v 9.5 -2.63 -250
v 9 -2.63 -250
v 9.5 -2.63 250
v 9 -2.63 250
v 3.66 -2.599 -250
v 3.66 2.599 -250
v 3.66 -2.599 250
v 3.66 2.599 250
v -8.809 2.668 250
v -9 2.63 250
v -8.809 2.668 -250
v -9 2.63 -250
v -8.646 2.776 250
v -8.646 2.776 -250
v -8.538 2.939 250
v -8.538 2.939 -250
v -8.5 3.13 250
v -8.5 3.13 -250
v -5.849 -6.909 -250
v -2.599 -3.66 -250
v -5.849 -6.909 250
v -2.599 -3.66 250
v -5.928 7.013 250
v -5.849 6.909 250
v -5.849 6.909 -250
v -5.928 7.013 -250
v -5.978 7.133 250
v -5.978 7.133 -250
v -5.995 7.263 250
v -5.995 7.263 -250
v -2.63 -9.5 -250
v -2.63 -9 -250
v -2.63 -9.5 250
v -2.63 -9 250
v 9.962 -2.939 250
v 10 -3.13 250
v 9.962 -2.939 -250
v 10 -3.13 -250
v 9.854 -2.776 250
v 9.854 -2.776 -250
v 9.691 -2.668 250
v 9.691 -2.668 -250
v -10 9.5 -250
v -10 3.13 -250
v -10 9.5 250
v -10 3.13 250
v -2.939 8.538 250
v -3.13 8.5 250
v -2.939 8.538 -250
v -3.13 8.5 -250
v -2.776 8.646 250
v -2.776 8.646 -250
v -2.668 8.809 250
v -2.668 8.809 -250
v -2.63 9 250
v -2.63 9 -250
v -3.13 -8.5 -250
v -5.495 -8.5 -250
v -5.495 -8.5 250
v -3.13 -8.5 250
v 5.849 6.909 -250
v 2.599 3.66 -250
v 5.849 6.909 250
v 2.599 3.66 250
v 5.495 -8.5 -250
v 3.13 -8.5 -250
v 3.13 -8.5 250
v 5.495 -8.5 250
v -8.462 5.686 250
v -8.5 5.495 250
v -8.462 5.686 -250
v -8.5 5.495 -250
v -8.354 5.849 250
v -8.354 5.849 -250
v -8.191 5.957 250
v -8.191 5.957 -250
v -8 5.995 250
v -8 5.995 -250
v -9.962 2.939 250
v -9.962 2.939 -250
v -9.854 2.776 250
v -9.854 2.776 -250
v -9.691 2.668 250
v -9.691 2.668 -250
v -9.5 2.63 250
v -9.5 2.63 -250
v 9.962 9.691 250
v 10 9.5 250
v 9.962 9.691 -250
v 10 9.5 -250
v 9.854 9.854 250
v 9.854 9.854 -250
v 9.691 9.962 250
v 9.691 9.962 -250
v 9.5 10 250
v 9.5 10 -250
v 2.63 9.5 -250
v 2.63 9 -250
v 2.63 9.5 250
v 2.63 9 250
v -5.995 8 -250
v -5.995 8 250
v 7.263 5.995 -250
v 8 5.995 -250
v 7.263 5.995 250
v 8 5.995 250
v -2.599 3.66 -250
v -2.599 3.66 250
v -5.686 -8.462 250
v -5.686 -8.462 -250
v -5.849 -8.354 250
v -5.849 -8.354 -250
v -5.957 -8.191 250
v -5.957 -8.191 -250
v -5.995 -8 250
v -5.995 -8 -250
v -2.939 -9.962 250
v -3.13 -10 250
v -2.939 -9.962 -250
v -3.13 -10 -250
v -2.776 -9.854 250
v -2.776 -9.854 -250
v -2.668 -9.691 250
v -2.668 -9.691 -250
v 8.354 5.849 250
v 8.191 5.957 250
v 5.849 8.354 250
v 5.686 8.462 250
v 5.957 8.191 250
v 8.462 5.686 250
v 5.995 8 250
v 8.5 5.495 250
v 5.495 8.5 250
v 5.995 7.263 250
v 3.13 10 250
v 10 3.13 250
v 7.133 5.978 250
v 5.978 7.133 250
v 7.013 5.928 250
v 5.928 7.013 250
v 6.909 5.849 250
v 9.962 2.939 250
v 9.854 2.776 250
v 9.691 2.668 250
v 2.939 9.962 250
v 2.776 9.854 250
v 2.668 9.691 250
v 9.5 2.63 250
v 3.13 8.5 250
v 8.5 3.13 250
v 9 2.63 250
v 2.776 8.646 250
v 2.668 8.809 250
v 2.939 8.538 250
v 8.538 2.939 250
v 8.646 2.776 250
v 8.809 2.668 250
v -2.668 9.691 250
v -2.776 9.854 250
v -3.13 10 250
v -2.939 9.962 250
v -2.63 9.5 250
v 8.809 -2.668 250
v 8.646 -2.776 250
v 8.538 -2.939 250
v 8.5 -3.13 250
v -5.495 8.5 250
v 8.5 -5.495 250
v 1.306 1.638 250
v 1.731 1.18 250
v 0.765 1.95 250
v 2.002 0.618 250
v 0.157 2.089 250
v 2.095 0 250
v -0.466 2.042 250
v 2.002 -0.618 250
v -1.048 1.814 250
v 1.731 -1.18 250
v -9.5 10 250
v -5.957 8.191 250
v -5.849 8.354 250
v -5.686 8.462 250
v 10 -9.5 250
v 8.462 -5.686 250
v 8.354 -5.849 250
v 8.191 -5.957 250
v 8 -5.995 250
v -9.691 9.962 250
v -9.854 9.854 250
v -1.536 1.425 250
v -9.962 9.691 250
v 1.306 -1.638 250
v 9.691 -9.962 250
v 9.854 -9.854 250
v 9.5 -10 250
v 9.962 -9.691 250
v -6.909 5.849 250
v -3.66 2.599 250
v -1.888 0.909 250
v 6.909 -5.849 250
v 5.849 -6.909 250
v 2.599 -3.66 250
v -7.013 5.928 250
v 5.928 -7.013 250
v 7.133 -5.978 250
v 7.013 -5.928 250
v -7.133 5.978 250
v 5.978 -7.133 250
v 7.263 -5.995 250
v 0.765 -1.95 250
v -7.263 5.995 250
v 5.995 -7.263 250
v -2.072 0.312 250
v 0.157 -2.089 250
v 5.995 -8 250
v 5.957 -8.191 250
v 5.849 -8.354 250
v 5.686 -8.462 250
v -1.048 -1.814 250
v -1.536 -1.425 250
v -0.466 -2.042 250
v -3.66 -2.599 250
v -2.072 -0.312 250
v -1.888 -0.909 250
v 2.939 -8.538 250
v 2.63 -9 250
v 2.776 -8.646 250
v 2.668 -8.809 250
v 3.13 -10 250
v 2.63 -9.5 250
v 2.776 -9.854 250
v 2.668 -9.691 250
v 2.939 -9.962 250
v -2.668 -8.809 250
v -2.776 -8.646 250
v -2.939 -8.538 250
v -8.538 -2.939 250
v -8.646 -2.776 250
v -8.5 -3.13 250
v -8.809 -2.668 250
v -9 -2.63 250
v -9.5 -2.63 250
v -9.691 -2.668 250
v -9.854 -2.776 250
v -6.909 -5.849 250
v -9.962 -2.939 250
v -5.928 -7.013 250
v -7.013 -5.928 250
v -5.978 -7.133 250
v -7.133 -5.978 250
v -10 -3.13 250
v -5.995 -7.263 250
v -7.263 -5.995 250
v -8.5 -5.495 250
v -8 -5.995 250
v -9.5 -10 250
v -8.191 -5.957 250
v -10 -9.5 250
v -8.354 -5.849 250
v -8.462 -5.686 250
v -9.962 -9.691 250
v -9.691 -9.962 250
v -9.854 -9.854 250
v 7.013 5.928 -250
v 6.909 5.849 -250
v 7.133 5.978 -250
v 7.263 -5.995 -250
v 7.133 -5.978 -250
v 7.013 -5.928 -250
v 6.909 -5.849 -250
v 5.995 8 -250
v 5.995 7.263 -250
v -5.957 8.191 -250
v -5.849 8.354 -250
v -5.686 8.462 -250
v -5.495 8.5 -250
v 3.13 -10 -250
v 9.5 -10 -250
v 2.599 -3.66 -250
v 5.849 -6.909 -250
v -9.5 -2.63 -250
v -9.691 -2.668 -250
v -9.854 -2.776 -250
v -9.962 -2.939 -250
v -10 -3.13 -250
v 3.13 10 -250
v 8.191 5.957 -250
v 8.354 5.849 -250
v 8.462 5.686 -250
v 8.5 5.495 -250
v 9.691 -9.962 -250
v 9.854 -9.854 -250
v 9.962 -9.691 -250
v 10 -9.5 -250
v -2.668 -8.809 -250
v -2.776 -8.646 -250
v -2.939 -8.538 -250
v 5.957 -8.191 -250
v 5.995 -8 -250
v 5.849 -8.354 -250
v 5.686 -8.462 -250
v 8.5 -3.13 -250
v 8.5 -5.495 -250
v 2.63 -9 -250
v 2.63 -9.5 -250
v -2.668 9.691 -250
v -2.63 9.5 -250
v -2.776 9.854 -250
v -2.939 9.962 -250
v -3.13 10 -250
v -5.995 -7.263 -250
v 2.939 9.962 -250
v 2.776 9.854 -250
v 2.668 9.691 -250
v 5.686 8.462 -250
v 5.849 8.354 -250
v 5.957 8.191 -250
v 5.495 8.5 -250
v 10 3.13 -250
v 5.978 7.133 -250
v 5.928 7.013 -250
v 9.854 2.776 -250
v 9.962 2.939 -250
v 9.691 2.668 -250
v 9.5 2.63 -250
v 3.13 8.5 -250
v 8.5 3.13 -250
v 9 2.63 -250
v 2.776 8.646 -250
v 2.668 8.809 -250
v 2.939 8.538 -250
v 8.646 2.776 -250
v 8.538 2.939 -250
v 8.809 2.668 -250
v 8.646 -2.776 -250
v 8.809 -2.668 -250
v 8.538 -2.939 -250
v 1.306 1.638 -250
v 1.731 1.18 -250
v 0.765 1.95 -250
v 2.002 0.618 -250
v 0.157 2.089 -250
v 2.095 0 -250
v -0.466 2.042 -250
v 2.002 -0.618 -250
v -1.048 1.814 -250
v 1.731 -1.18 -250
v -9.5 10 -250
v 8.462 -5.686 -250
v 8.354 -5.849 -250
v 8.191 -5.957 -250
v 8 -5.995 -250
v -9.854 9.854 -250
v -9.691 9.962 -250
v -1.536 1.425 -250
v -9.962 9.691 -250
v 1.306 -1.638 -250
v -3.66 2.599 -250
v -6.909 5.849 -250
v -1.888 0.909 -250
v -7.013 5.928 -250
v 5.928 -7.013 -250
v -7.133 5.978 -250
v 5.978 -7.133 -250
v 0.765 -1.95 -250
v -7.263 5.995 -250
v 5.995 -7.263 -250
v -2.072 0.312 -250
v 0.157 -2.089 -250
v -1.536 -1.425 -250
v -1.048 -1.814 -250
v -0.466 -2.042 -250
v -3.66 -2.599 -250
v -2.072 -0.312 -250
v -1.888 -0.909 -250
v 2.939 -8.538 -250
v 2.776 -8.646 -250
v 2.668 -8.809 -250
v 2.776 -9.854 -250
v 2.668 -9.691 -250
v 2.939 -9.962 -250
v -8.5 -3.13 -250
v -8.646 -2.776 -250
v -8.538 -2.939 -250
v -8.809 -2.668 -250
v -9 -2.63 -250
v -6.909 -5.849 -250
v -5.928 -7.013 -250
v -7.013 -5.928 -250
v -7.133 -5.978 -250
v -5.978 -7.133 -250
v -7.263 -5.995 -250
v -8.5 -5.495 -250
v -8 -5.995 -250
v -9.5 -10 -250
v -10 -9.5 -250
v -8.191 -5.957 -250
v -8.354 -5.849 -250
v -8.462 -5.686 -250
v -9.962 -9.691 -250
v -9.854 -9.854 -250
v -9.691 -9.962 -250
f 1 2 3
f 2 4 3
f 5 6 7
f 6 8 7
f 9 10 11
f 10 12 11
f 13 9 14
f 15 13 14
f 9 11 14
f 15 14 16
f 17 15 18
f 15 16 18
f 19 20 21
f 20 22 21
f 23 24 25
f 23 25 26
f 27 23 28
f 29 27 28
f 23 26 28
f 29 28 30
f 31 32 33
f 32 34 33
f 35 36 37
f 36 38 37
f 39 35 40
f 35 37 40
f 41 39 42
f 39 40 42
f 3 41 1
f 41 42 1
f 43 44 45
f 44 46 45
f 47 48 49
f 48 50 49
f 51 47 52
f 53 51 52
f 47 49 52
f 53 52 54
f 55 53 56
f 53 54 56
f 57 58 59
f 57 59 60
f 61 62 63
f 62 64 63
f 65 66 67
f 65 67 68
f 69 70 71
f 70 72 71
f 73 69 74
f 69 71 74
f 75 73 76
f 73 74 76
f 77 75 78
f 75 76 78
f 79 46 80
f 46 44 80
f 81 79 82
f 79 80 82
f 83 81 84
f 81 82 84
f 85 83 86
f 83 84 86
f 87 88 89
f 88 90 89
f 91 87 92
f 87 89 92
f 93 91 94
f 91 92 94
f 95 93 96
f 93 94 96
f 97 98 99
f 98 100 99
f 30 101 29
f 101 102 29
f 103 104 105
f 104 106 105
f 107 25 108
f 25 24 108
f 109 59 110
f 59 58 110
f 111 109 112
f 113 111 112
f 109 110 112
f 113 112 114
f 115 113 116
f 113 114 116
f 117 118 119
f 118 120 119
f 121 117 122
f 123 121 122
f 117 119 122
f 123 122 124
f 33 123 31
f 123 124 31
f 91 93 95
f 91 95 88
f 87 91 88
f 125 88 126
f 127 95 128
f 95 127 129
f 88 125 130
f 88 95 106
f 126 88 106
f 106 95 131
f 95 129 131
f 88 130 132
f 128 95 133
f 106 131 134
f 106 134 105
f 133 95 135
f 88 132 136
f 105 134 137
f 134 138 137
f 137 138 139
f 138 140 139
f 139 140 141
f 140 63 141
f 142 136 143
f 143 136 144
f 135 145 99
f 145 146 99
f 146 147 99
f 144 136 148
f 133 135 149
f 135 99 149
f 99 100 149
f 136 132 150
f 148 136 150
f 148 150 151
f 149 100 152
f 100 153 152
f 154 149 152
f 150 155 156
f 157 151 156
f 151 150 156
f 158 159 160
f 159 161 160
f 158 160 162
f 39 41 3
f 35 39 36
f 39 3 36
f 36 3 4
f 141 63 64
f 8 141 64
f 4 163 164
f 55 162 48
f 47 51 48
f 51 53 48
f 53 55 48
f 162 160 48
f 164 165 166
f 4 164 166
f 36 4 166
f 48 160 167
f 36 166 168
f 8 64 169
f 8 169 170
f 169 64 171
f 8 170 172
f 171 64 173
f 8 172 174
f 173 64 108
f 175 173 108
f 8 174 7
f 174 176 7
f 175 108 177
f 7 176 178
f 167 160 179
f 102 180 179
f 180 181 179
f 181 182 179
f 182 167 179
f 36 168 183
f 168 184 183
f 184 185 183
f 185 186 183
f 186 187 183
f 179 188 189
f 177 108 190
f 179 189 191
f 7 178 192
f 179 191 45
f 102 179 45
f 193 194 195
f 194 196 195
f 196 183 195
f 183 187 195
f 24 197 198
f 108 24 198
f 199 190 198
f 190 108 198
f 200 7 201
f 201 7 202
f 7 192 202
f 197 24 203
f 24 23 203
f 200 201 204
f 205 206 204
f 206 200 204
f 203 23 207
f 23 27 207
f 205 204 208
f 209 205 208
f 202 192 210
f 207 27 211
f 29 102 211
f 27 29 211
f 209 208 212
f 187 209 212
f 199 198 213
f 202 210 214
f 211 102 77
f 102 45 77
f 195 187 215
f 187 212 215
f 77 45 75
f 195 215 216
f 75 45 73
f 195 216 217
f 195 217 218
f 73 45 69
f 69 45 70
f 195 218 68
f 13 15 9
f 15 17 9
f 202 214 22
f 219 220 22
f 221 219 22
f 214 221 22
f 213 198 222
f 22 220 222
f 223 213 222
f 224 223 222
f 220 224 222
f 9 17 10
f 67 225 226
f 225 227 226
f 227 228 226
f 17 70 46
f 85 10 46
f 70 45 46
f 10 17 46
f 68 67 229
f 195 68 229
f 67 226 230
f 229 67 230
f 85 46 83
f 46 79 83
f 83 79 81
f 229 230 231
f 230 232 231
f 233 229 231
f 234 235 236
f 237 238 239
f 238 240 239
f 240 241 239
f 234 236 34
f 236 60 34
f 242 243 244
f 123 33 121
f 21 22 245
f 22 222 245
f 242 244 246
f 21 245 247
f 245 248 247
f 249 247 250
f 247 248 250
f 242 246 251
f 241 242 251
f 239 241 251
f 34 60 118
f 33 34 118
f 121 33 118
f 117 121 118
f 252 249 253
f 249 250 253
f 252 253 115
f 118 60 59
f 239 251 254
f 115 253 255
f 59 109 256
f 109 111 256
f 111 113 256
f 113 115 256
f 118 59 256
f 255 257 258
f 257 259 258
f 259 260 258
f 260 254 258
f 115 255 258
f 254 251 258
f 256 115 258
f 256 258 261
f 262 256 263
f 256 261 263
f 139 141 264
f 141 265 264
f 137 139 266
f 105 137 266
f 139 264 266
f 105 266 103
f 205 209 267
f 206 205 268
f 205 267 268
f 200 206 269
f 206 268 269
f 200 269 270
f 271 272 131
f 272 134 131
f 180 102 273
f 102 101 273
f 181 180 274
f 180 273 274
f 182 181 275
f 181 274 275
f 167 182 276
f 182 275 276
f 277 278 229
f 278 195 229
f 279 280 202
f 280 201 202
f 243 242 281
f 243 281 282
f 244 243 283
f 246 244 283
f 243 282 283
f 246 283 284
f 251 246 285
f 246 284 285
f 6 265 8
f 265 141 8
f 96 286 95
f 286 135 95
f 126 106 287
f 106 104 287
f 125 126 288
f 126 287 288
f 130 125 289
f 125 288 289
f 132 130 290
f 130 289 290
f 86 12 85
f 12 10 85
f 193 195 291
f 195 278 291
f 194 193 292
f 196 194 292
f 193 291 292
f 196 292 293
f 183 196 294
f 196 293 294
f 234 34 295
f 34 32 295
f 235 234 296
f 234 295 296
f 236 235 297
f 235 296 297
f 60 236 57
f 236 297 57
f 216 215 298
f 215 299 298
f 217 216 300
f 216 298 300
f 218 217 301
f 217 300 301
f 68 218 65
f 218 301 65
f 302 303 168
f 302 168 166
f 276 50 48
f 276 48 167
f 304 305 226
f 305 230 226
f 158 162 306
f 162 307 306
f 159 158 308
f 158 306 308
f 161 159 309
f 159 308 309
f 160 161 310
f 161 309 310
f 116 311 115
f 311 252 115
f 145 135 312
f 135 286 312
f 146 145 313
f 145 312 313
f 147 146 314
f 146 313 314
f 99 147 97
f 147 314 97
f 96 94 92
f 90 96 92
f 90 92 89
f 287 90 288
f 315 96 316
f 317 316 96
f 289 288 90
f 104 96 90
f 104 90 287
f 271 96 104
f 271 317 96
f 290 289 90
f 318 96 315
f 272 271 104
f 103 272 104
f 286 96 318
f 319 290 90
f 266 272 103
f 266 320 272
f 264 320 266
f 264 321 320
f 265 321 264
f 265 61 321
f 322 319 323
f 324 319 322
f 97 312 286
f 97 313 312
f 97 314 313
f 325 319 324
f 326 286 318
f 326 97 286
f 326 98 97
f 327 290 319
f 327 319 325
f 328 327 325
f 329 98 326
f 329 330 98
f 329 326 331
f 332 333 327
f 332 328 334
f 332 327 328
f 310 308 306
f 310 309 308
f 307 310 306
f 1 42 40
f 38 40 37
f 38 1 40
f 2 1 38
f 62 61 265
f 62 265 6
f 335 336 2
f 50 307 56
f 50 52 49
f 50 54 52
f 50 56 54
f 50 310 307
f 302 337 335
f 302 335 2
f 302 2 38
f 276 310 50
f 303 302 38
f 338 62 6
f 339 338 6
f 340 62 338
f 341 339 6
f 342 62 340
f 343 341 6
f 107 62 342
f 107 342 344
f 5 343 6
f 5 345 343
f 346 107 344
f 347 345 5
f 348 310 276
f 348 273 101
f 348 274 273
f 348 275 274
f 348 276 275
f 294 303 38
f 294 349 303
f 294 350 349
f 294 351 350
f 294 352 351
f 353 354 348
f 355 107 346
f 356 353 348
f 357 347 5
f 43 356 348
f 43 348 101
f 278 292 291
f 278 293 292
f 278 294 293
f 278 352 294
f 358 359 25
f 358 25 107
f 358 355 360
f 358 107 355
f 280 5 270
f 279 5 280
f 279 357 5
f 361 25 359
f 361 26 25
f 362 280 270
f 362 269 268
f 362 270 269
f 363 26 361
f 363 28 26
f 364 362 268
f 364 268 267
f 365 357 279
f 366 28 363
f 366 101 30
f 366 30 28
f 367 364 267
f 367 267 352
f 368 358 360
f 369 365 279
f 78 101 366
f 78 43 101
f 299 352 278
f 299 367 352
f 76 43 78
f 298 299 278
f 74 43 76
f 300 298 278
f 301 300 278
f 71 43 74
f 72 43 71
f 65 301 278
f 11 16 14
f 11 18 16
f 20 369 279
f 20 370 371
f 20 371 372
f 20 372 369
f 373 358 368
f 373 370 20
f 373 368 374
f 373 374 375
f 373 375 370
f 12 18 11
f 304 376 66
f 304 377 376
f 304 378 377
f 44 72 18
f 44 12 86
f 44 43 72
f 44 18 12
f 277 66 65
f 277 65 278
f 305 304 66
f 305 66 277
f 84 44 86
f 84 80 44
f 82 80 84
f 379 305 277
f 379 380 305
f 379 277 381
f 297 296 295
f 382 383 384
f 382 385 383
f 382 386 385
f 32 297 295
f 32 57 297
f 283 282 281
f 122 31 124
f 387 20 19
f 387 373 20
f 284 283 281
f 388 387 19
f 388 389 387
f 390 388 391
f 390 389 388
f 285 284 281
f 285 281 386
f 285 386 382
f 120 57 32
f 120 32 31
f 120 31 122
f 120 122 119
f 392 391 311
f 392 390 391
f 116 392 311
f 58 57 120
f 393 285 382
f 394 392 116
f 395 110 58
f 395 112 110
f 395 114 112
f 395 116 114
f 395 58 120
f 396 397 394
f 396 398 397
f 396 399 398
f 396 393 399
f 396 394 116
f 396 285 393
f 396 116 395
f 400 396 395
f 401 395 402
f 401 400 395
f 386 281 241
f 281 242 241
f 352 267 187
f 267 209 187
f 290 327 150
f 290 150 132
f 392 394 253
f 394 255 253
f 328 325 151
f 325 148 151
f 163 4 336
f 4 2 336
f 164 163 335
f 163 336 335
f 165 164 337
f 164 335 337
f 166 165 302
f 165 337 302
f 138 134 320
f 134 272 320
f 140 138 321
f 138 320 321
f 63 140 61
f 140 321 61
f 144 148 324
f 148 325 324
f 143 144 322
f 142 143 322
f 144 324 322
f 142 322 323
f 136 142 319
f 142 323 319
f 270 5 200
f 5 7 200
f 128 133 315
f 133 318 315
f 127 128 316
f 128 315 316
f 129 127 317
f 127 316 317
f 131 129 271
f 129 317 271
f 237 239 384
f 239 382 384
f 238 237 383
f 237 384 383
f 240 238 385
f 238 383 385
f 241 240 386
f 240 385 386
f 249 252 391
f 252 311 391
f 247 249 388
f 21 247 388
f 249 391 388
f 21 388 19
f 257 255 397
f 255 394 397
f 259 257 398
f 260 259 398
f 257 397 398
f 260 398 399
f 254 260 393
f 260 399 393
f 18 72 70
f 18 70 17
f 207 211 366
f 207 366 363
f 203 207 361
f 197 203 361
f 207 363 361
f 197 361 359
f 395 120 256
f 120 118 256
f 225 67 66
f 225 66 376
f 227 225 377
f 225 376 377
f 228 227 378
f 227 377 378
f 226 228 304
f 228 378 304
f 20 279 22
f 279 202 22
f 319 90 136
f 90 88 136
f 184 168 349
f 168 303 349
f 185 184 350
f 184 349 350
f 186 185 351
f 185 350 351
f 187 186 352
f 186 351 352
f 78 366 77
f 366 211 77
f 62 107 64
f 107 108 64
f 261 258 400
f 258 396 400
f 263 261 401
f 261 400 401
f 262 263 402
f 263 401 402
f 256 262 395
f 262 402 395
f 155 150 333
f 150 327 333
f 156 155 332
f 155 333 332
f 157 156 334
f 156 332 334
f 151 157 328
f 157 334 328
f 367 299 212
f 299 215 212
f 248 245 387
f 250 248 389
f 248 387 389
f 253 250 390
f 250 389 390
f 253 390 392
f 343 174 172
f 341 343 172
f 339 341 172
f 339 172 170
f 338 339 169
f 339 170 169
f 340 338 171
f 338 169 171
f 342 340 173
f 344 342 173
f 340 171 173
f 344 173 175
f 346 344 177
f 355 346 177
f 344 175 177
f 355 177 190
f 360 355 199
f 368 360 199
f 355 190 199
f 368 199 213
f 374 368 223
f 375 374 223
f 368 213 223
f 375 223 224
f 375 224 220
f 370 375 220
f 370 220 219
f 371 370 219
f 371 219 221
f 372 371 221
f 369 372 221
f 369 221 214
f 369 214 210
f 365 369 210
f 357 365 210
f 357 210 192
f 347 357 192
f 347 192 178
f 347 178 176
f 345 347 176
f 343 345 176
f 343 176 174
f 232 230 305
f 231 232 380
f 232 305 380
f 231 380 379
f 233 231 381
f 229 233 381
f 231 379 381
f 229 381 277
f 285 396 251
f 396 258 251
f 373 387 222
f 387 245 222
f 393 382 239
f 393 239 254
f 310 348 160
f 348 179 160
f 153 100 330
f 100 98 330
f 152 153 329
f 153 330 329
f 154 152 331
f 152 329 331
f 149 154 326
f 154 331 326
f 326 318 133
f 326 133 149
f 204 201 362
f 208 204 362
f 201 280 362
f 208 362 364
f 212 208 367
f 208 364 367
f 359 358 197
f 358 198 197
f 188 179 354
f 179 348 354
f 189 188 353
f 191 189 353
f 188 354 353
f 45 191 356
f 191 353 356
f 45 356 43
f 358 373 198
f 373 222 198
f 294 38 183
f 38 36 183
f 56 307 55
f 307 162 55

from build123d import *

# Parameters (mm, degrees)
BOSS_EXTRUDE1_DEPTH      = 250
FILLET1_R                = 0.5
CIRPATTERN3_COUNT        = 4
FILLET1_OF_CIRPATTERN3_R = 0.5
SKETCH3_R                = 2.095
CUT_EXTRUDE1_DEPTH       = 501.199960016


with BuildPart() as part:
    # Sketch2 → Boss-Extrude1 (new, symmetric)
    with BuildSketch(Plane.XY):
        Polygon((0, 3.66), (2.599339828, 3.66), (5.995, 7.055660172), (5.995, 8.5), (2.63, 8.5), (2.63, 10), (10, 10), (10, 2.63), (8.5, 2.63), (8.5, 5.995), (7.055660172, 5.995), (3.66, 2.599339828), (3.66, 0), (0, 0), align=None)
    boss_extrude1 = extrude(amount=BOSS_EXTRUDE1_DEPTH, both=True)

    # Fillet1
    fillet1_edges = [part.edges().sort_by_distance(p)[0] for p in [
        (5.995, 7.055660172, 0),
        (5.995, 8.5, 0),
        (2.63, 8.5, 0),
        (2.63, 10, 0),
        (10, 10, 0),
        (10, 2.63, 0),
        (8.5, 2.63, 0),
        (8.5, 5.995, 0),
        (7.055660172, 5.995, 0),
    ]]
    fillet(fillet1_edges, radius=FILLET1_R)

    # CirPattern3: Boss-Extrude1 ×4 about axis
    cirpattern3_axis = Axis((0, 0, 250), (0, 0, -1))
    for i in range(1, CIRPATTERN3_COUNT):
        add(boss_extrude1.rotate(cirpattern3_axis, i * 360 / CIRPATTERN3_COUNT))

    # Fillet1 of CirPattern3
    fillet1_of_cirpattern3_edges = [part.edges().sort_by_distance(p)[0] for p in [
        (7.055660172, -5.995, 0),
        (8.5, -5.995, 0),
        (8.5, -2.63, 0),
        (10, -2.63, 0),
        (10, -10, 0),
        (2.63, -10, 0),
        (2.63, -8.5, 0),
        (5.995, -8.5, 0),
        (5.995, -7.055660172, 0),
        (-5.995, -7.055660172, 0),
        (-5.995, -8.5, 0),
        (-2.63, -8.5, 0),
        (-2.63, -10, 0),
        (-10, -10, 0),
        (-10, -2.63, 0),
        (-8.5, -2.63, 0),
        (-8.5, -5.995, 0),
        (-7.055660172, -5.995, 0),
        (-7.055660172, 5.995, 0),
        (-8.5, 5.995, 0),
        (-8.5, 2.63, 0),
        (-10, 2.63, 0),
        (-10, 10, 0),
        (-2.63, 10, 0),
        (-2.63, 8.5, 0),
        (-5.995, 8.5, 0),
        (-5.995, 7.055660172, 0),
    ]]
    fillet(fillet1_of_cirpattern3_edges, radius=FILLET1_OF_CIRPATTERN3_R)

    # Sketch3 → Cut-Extrude1 (cut, through all)
    with BuildSketch(Plane.XY.offset(250)):
        Circle(SKETCH3_R)
    extrude(amount=-CUT_EXTRUDE1_DEPTH, mode=Mode.SUBTRACT)


solid = part.part
